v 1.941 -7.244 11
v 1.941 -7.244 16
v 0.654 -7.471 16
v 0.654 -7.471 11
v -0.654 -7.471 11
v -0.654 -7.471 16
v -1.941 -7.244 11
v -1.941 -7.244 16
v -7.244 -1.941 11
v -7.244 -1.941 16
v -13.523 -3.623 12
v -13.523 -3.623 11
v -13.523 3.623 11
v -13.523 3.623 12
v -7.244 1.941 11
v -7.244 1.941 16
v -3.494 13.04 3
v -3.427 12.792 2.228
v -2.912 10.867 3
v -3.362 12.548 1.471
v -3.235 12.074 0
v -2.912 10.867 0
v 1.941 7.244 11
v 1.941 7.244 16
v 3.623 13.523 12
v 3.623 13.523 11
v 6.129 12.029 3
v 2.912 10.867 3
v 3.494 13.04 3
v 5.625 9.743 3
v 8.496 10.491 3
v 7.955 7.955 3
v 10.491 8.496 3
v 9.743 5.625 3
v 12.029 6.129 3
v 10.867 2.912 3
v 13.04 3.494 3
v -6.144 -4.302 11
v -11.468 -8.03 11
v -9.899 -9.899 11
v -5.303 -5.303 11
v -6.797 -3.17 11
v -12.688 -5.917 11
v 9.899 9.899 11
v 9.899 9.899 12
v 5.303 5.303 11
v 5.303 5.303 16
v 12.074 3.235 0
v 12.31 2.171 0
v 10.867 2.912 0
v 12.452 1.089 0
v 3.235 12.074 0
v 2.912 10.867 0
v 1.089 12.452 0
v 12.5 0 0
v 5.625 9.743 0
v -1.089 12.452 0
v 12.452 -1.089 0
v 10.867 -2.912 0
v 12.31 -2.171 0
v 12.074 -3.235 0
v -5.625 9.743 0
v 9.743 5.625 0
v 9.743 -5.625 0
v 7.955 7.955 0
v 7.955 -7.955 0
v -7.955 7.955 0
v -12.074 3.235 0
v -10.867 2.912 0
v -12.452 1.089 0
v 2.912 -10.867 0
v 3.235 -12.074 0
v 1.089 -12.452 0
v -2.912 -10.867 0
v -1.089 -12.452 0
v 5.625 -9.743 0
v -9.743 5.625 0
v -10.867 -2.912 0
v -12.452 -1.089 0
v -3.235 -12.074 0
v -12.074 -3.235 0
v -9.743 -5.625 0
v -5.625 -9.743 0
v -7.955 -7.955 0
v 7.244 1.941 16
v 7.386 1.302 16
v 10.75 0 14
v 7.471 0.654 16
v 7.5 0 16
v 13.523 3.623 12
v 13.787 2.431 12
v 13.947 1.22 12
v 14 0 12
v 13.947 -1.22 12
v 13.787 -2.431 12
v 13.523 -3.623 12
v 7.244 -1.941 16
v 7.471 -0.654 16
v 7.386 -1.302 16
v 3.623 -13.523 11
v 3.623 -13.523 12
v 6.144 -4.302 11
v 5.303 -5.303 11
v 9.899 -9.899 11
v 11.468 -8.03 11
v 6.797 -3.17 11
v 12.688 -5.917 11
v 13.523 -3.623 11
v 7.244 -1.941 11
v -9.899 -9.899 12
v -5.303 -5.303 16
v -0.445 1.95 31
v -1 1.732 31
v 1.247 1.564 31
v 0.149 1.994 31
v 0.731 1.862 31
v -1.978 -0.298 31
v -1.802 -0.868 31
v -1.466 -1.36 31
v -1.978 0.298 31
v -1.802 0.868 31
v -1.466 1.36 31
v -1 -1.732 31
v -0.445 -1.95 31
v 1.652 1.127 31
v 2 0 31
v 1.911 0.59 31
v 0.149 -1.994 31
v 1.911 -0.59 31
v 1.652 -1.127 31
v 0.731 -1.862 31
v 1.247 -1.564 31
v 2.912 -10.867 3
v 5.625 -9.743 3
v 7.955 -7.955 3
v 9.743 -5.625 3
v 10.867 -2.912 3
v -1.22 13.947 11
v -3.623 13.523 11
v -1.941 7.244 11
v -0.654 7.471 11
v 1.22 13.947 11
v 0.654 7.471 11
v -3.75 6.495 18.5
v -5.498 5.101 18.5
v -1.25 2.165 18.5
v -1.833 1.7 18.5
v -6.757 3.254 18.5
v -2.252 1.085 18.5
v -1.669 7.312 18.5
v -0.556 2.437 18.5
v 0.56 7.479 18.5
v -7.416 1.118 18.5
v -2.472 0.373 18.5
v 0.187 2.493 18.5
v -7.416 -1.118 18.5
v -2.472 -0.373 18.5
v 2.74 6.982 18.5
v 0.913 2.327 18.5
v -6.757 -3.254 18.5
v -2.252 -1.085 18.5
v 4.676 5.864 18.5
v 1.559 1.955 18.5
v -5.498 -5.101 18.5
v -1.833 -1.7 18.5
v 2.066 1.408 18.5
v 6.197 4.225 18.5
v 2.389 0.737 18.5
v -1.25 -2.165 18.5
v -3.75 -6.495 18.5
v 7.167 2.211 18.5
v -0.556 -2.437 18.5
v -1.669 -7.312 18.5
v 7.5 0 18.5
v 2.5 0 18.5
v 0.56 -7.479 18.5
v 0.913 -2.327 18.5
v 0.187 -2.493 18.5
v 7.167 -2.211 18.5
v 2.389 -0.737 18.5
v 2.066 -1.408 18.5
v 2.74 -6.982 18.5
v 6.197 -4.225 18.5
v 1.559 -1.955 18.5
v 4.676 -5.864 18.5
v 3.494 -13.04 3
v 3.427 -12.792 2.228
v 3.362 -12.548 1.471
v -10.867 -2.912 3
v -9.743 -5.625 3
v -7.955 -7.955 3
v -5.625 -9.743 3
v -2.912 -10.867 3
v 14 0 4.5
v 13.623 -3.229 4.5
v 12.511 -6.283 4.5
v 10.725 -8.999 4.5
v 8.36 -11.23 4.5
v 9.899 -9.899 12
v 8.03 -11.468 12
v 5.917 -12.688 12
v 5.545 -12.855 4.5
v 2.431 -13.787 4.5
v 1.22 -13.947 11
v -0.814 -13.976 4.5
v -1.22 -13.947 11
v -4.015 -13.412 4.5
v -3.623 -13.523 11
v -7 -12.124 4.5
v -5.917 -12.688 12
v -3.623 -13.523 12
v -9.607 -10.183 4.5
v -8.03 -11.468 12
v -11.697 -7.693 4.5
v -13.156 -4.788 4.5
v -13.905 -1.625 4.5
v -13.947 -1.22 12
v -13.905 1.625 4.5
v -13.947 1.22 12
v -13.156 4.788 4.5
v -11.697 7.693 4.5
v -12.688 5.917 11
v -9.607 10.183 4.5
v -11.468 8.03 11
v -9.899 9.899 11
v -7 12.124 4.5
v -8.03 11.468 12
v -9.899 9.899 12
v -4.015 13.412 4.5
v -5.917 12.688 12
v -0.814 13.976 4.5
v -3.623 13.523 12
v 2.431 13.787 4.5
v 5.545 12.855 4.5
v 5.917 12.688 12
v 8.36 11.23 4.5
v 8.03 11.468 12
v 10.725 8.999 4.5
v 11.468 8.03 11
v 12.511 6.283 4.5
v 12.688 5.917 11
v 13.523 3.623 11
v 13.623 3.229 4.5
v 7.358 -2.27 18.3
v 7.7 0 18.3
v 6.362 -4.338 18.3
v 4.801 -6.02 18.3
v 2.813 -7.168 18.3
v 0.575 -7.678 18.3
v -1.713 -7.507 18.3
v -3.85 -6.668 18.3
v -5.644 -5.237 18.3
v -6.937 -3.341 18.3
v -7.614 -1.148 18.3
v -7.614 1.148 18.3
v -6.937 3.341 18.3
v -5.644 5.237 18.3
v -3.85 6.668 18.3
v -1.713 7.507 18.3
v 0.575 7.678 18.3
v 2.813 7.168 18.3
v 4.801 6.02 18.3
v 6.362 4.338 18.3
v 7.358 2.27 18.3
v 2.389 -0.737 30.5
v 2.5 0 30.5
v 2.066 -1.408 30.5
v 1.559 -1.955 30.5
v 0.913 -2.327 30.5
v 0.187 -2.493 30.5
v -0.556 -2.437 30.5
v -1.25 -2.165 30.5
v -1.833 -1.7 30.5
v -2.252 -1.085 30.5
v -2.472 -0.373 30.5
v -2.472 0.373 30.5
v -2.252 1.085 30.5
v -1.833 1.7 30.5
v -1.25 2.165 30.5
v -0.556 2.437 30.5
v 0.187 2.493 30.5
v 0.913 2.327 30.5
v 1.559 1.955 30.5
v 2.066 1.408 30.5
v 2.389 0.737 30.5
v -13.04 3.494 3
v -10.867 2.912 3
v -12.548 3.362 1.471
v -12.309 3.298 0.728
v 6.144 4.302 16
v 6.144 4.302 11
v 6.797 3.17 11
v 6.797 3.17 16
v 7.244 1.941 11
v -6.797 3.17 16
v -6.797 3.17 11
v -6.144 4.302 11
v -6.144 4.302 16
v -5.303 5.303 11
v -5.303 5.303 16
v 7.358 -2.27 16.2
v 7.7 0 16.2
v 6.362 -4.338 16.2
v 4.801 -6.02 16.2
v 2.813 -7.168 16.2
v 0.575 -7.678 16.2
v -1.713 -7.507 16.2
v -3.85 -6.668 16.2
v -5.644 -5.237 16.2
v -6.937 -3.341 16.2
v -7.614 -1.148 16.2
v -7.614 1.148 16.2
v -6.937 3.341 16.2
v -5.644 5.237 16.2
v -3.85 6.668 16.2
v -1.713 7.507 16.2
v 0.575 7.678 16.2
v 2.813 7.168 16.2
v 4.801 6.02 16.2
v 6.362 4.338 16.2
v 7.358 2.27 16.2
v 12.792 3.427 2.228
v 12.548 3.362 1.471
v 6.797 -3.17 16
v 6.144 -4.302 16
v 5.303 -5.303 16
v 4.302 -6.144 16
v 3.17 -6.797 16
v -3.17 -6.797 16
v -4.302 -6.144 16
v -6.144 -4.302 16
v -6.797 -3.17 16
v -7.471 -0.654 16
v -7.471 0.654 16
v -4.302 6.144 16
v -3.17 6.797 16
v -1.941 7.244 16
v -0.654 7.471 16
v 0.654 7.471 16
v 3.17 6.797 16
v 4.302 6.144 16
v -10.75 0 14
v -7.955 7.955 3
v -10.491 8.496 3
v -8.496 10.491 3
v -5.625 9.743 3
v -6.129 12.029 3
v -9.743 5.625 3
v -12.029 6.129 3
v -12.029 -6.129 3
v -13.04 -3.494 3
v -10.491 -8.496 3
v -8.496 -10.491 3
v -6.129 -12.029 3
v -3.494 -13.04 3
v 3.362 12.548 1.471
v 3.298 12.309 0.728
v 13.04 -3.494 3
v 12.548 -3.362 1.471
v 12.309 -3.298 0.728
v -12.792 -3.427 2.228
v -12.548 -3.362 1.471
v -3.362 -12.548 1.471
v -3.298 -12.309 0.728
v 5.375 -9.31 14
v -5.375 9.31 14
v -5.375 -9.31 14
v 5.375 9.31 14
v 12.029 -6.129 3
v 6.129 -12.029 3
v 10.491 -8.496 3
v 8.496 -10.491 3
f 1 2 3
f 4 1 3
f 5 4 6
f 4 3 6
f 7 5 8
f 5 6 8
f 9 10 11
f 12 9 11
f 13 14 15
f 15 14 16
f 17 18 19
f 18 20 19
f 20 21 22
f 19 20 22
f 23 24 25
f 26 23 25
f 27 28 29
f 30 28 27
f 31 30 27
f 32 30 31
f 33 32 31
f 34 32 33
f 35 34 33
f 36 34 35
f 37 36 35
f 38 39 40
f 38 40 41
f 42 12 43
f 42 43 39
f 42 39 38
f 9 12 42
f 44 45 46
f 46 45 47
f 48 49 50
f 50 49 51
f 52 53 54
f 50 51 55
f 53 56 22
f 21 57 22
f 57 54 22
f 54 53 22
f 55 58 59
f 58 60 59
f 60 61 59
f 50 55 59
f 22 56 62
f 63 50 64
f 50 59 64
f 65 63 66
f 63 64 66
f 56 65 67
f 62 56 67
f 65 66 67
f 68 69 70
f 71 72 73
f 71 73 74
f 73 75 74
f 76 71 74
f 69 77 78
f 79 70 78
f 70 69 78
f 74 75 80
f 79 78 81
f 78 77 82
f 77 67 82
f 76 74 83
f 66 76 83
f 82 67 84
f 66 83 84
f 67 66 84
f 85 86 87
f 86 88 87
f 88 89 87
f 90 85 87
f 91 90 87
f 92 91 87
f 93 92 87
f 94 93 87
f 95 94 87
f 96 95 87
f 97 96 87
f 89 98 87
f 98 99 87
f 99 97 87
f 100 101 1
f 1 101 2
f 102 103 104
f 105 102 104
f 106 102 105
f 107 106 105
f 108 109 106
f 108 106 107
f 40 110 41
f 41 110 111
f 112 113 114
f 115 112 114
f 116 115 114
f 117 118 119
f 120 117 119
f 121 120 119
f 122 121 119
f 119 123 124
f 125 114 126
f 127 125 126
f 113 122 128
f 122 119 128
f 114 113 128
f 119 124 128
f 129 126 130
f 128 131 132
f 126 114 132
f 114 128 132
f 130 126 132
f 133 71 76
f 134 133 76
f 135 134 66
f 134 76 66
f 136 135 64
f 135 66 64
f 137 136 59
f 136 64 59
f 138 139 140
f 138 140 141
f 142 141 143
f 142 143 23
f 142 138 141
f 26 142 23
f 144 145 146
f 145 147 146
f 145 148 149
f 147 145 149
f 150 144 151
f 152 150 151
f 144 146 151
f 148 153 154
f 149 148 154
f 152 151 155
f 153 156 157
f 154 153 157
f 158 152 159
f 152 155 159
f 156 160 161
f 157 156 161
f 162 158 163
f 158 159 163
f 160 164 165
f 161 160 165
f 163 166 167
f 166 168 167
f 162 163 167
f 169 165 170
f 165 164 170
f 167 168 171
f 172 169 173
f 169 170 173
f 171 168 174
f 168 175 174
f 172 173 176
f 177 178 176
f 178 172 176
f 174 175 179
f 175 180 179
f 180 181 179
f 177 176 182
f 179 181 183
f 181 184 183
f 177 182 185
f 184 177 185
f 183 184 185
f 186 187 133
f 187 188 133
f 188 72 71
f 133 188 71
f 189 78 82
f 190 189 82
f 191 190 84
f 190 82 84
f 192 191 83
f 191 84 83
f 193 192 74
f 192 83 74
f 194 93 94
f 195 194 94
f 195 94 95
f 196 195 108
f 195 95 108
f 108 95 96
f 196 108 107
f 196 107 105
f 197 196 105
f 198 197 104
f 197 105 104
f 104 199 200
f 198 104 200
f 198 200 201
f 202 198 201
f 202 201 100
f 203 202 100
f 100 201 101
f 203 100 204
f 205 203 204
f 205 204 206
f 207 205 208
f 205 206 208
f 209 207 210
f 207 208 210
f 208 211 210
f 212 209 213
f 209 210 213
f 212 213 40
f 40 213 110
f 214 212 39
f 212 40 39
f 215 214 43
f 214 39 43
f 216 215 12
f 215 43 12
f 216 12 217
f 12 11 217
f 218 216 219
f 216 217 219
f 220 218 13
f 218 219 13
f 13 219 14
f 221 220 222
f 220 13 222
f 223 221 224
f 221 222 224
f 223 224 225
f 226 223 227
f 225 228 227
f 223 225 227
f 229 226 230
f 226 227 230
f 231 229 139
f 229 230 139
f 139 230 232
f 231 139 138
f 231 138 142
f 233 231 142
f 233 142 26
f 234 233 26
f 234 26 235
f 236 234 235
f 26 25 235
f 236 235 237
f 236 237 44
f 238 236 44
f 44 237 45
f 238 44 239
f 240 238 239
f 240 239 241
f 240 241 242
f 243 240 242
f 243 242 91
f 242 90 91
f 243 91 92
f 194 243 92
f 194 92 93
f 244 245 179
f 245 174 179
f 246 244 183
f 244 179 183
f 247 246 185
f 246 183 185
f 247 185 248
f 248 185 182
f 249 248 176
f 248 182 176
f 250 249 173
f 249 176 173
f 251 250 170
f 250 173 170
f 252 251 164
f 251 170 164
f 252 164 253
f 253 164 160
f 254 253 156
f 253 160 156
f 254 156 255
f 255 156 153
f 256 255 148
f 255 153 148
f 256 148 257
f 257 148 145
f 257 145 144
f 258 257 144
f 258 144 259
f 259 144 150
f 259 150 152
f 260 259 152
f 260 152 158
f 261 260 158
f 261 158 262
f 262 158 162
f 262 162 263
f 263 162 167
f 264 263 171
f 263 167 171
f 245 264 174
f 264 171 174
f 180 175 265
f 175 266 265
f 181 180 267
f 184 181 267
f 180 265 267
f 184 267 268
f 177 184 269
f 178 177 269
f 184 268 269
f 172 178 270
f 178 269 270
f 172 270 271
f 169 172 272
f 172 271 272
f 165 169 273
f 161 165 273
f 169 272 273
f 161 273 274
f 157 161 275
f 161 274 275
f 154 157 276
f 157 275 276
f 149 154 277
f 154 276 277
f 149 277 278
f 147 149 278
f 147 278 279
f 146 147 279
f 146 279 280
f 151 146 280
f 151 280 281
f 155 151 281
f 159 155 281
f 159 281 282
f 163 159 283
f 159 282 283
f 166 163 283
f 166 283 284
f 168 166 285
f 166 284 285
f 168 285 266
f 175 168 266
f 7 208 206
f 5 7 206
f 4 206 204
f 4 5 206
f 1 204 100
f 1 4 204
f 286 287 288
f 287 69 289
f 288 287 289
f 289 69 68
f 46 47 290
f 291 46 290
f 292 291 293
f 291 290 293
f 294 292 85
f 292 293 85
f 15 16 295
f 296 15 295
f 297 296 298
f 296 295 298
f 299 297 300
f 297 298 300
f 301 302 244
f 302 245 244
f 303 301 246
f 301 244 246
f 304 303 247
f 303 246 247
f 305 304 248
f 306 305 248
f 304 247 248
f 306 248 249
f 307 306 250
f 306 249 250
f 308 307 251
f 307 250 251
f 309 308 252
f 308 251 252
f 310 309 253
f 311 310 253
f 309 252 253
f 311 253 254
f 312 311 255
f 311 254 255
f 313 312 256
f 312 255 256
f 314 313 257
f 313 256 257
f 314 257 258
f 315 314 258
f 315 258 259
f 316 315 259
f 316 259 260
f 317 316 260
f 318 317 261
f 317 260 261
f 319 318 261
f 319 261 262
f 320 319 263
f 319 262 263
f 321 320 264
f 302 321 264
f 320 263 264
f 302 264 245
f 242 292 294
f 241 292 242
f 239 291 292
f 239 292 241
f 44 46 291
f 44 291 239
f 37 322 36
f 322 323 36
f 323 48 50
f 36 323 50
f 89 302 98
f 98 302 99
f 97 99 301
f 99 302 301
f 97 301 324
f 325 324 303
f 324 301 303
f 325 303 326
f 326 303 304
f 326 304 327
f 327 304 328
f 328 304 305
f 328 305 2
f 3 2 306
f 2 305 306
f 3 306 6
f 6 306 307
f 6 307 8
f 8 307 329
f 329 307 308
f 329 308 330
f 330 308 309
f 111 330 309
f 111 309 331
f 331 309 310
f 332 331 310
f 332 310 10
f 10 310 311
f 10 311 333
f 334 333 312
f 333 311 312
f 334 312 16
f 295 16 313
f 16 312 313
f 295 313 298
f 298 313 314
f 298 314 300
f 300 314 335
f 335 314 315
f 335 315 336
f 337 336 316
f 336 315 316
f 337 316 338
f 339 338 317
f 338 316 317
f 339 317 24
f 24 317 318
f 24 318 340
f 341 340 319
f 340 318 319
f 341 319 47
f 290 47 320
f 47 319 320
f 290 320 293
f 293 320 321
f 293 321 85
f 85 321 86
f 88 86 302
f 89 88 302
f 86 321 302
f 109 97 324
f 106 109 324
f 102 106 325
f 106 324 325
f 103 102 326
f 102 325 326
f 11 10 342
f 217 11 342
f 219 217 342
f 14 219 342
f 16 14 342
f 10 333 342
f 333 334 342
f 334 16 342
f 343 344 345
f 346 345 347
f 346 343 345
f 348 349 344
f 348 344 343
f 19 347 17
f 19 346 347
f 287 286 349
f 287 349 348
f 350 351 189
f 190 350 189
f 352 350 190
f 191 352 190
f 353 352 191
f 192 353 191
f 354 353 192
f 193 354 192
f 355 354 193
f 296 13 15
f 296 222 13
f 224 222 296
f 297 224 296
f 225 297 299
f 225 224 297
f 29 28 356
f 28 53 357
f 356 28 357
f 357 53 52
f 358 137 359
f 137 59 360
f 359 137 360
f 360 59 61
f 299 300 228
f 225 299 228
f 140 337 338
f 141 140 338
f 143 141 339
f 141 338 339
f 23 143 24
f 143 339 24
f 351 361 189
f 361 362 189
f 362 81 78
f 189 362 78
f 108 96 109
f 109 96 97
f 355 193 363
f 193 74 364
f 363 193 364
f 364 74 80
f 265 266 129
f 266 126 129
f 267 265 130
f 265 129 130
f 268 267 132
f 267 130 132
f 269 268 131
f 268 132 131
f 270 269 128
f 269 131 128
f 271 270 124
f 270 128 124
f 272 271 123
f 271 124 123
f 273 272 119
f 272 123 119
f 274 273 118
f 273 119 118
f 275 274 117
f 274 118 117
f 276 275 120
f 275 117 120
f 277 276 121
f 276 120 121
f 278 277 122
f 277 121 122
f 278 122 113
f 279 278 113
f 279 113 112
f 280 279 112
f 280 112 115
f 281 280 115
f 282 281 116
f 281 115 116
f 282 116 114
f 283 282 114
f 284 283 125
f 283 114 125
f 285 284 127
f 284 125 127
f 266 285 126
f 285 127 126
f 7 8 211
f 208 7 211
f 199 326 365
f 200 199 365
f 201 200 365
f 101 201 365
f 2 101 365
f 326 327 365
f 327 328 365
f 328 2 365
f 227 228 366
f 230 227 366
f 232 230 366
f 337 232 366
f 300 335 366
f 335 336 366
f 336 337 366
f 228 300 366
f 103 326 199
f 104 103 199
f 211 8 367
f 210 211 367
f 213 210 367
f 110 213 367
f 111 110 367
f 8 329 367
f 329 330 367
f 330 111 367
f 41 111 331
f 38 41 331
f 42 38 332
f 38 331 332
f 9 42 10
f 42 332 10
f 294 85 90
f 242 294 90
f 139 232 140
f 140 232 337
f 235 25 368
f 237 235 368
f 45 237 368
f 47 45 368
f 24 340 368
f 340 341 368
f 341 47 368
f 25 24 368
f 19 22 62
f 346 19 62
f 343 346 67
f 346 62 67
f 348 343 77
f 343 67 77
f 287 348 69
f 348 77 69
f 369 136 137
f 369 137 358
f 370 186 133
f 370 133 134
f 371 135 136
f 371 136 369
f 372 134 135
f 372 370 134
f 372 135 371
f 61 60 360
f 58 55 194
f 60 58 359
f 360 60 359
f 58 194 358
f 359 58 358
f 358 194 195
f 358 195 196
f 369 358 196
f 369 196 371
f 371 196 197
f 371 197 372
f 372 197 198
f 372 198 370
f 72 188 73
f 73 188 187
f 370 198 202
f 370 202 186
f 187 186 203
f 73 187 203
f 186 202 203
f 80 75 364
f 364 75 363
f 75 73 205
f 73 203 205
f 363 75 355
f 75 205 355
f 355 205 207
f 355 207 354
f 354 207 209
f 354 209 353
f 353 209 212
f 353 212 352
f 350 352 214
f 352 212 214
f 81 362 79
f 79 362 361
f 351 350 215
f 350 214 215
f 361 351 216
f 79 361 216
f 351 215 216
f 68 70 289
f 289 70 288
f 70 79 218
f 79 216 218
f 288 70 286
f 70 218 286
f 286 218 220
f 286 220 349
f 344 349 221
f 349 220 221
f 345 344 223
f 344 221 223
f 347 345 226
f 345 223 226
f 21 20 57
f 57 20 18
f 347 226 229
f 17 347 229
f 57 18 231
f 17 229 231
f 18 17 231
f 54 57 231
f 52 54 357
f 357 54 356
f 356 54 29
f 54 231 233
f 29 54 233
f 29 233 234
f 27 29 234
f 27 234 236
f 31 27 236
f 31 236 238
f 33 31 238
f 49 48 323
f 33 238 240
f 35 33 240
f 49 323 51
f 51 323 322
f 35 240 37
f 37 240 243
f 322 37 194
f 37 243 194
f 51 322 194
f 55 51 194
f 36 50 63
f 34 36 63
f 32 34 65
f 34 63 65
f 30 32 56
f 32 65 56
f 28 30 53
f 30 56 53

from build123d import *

# Parameters (mm, degrees)
F3_DEPTH = 5
F5_DEPTH = 3


with BuildPart() as f1:
    # F0 (on Front) → F1 (revolve)
    with BuildSketch(Plane.XZ):
        Polygon((0, 16), (0, 0), (12.5, 0), (14, 4.5), (14, 12), (7.5, 16), align=None)
    revolve(axis=Axis((0, 0, 8), (0, 0, -1)))

    # F2 (on face) → F3 (cut)
    with BuildSketch(Plane.XY.offset(16)):
        with BuildLine():
            ThreePointArc((-1.941143, 7.244444), (0, 7.5), (1.941143, 7.244444))
            Line((1.941143, 7.244444), (3.623467, 13.522962))
            ThreePointArc((3.623467, 13.522962), (0, 14), (-3.623467, 13.522962))
            Line((-3.623467, 13.522962), (-1.941143, 7.244444))
        make_face()
        with BuildLine():
            ThreePointArc((-7.244444, 1.941143), (-6.495191, 3.75), (-5.303301, 5.303301))
            Line((-5.303301, 5.303301), (-9.899495, 9.899495))
            ThreePointArc((-9.899495, 9.899495), (-12.124356, 7), (-13.522962, 3.623467))
            Line((-13.522962, 3.623467), (-7.244444, 1.941143))
        make_face()
        with BuildLine():
            ThreePointArc((-5.303301, -5.303301), (-6.495191, -3.75), (-7.244444, -1.941143))
            Line((-7.244444, -1.941143), (-13.522962, -3.623467))
            ThreePointArc((-13.522962, -3.623467), (-12.124356, -7), (-9.899495, -9.899495))
            Line((-9.899495, -9.899495), (-5.303301, -5.303301))
        make_face()
        with BuildLine():
            ThreePointArc((1.941143, -7.244444), (0, -7.5), (-1.941143, -7.244444))
            Line((-1.941143, -7.244444), (-3.623467, -13.522962))
            ThreePointArc((-3.623467, -13.522962), (0, -14), (3.623467, -13.522962))
            Line((3.623467, -13.522962), (1.941143, -7.244444))
        make_face()
        with BuildLine():
            ThreePointArc((7.244444, -1.941143), (6.495191, -3.75), (5.303301, -5.303301))
            Line((5.303301, -5.303301), (9.899495, -9.899495))
            ThreePointArc((9.899495, -9.899495), (12.124356, -7), (13.522962, -3.623467))
            Line((13.522962, -3.623467), (7.244444, -1.941143))
        make_face()
        with BuildLine():
            ThreePointArc((5.303301, 5.303301), (6.495191, 3.75), (7.244444, 1.941143))
            Line((7.244444, 1.941143), (13.522962, 3.623467))
            ThreePointArc((13.522962, 3.623467), (12.124356, 7), (9.899495, 9.899495))
            Line((9.899495, 9.899495), (5.303301, 5.303301))
        make_face()
    extrude(amount=-F3_DEPTH, mode=Mode.SUBTRACT)

    # F4 (on face) → F5 (cut)
    with BuildSketch(Plane(origin=(0, 0, 0), x_dir=(1, 0, 0), z_dir=(0, 0, -1))):
        with BuildLine():
            ThreePointArc((2.911714, 10.866666), (7.954951, 7.954951), (10.866666, 2.911714))
            Line((10.866666, 2.911714), (13.522962, 3.623467))
            ThreePointArc((13.522962, 3.623467), (9.899495, 9.899495), (3.623467, 13.522962))
            Line((3.623467, 13.522962), (2.911714, 10.866666))
        make_face()
        with BuildLine():
            Line((-2.911714, 10.866666), (-3.623467, 13.522962))
            ThreePointArc((-3.623467, 13.522962), (-9.899495, 9.899495), (-13.522962, 3.623467))
            Line((-13.522962, 3.623467), (-10.866666, 2.911714))
            ThreePointArc((-10.866666, 2.911714), (-7.954951, 7.954951), (-2.911714, 10.866666))
        make_face()
        with BuildLine():
            Line((-10.866666, -2.911714), (-13.522962, -3.623467))
            ThreePointArc((-13.522962, -3.623467), (-9.899495, -9.899495), (-3.623467, -13.522962))
            Line((-3.623467, -13.522962), (-2.911714, -10.866666))
            ThreePointArc((-2.911714, -10.866666), (-7.954951, -7.954951), (-10.866666, -2.911714))
        make_face()
        with BuildLine():
            Line((2.911714, -10.866666), (3.623467, -13.522962))
            ThreePointArc((3.623467, -13.522962), (9.899495, -9.899495), (13.522962, -3.623467))
            Line((13.522962, -3.623467), (10.866666, -2.911714))
            ThreePointArc((10.866666, -2.911714), (7.954951, -7.954951), (2.911714, -10.866666))
        make_face()
    extrude(amount=-F5_DEPTH, mode=Mode.SUBTRACT)

    # F6 (on Front) → F7 (revolve)
    with BuildSketch(Plane.XZ):
        Polygon((0, 31), (0, 16), (7.5, 16), (7.7, 16.2), (7.7, 18.3), (7.5, 18.5), (2.5, 18.5), (2.5, 30.5), (2, 31), align=None)
    revolve(axis=Axis((0, 0, 23.5), (0, 0, -1)))


solid = f1.part
